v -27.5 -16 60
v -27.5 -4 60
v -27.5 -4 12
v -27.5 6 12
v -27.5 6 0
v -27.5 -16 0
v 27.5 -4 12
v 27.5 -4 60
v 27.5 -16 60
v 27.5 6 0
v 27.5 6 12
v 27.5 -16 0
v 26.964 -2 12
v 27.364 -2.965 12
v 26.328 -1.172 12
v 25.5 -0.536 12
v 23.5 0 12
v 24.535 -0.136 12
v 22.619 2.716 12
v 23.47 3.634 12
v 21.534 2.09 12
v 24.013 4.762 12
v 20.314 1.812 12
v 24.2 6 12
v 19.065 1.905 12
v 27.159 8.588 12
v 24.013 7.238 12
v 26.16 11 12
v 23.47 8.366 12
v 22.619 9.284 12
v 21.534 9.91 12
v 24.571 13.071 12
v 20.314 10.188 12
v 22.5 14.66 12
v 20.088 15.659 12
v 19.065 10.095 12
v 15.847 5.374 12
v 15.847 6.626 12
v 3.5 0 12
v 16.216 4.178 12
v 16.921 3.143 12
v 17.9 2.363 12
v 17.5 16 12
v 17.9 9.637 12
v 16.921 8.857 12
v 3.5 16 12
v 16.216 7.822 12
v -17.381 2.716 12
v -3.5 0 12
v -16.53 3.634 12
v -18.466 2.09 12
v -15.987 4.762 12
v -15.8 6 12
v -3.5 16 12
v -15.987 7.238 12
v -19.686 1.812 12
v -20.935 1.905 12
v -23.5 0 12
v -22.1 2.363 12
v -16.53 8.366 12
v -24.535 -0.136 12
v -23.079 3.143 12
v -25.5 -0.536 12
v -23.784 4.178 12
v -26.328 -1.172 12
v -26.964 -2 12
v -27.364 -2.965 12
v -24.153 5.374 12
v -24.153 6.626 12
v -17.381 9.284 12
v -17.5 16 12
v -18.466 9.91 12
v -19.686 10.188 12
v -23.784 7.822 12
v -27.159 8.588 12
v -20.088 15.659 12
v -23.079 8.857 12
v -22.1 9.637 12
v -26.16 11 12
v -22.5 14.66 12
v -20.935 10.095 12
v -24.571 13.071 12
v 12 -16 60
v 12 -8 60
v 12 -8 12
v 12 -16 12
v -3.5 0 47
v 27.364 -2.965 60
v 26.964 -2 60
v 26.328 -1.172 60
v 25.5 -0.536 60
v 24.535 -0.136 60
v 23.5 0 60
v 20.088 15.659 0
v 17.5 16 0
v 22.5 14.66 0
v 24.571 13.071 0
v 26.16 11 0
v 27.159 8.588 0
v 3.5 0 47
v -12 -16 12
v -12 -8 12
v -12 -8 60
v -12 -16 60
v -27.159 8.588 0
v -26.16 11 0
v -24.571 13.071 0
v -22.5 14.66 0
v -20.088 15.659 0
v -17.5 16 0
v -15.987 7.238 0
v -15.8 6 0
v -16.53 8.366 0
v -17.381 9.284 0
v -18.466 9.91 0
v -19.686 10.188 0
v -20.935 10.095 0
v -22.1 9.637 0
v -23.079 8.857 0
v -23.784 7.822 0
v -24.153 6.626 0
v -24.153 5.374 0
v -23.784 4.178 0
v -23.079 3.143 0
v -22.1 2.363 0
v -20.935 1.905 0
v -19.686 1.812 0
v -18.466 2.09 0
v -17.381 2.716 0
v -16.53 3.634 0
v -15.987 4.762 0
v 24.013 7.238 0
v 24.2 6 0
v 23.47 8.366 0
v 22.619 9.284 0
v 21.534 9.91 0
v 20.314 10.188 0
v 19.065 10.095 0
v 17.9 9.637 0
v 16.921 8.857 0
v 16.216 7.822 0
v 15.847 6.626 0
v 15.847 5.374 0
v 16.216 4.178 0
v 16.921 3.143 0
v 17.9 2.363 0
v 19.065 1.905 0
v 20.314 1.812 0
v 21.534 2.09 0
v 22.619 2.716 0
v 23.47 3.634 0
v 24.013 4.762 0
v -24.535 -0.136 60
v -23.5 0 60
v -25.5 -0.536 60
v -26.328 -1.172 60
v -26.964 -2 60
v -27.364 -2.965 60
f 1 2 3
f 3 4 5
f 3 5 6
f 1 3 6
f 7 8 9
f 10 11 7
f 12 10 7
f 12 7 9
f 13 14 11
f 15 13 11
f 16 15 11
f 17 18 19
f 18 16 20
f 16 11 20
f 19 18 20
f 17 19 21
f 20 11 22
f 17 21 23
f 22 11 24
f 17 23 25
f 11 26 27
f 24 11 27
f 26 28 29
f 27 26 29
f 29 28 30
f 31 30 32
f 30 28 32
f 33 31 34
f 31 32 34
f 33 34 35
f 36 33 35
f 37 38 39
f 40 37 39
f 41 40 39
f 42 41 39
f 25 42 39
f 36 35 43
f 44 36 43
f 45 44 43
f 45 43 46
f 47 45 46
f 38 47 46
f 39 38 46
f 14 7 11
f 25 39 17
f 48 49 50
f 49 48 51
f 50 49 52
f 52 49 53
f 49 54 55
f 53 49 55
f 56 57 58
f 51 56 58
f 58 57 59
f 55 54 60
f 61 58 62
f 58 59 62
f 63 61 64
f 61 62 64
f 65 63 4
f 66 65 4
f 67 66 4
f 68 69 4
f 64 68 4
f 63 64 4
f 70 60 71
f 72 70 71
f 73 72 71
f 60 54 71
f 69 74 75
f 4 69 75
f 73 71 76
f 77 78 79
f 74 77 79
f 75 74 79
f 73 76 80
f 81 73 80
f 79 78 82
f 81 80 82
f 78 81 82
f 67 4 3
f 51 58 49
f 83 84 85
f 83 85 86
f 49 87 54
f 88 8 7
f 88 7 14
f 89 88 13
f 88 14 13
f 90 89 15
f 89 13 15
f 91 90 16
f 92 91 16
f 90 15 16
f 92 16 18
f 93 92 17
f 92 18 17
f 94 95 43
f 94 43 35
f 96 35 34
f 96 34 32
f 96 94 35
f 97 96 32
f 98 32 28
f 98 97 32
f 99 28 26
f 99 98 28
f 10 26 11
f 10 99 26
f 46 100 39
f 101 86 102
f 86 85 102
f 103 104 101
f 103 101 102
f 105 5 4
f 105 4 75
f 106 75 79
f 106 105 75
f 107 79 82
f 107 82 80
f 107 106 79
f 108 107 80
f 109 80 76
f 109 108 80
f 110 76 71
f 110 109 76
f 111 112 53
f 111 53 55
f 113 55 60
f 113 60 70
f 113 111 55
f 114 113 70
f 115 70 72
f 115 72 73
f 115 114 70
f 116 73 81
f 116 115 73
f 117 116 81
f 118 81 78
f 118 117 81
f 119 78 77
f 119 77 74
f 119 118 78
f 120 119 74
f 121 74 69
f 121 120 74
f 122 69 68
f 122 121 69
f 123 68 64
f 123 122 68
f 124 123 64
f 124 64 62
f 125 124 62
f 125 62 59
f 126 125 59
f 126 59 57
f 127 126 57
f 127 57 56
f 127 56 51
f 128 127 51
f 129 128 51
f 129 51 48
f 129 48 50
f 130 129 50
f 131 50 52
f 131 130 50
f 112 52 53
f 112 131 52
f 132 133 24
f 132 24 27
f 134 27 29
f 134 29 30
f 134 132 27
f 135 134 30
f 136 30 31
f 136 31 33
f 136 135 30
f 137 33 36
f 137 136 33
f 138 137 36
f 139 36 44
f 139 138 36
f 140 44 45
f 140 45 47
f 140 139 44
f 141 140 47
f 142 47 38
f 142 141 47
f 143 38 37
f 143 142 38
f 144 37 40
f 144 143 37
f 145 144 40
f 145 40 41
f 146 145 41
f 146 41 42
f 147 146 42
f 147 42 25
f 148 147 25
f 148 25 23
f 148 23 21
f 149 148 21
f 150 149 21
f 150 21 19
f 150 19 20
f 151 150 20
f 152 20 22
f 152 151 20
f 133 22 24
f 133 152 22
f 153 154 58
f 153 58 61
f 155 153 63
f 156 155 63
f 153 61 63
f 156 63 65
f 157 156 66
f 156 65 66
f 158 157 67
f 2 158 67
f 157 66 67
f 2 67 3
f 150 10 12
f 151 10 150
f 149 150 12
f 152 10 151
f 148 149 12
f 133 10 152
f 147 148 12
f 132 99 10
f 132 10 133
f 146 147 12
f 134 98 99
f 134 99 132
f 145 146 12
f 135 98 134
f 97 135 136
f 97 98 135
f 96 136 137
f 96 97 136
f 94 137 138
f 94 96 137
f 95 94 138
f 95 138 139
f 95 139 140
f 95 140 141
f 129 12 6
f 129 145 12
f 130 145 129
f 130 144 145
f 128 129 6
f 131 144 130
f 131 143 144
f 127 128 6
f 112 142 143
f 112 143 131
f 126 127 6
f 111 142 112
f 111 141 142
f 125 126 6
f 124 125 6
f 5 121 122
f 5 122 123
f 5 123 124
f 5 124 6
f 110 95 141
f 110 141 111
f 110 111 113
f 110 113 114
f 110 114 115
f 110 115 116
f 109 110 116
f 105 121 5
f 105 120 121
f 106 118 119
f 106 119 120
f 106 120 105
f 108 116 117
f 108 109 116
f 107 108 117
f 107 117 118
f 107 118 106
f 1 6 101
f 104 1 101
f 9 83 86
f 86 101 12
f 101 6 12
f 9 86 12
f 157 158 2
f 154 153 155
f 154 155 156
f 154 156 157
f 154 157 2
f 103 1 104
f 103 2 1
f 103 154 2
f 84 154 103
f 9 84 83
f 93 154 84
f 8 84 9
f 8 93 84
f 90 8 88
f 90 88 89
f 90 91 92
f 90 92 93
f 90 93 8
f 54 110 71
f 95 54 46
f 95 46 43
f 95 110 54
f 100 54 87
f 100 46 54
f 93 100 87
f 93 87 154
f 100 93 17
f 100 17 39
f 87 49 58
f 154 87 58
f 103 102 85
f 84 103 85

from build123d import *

# Parameters (mm, degrees)
IZIM1_R                     = 4.2
Y_KSEKLIK_EKSTR_ZYON1_DEPTH = 12
Y_KSEKLIK_EKSTR_ZYON2_DEPTH = 48
Y_KSEKLIK_EKSTR_ZYON3_DEPTH = 3.5


with BuildPart() as part:
    # Çizim1 → Yükseklik-Ekstrüzyon1 (new body)
    with BuildSketch(Plane.XY):
        with BuildLine():
            Line((-17.5, 16), (17.5, 16))
            ThreePointArc((17.5, 16), (24.571067812, 13.071067812), (27.5, 6))
            Line((27.5, 6), (27.5, -16))
            Line((27.5, -16), (-27.5, -16))
            Line((-27.5, -16), (-27.5, 6))
            ThreePointArc((-27.5, 6), (-24.571067812, 13.071067812), (-17.5, 16))
        make_face()
        with Locations((-20, 6)):
            Circle(IZIM1_R, mode=Mode.SUBTRACT)
        with Locations((20, 6)):
            Circle(IZIM1_R, mode=Mode.SUBTRACT)
    extrude(amount=Y_KSEKLIK_EKSTR_ZYON1_DEPTH)

    # Çizim2 → Yükseklik-Ekstrüzyon2 (add)
    with BuildSketch(Plane.XY.offset(12)):
        with BuildLine():
            Line((-27.5, -16), (-12, -16))
            Line((-12, -16), (-12, -8))
            Line((-12, -8), (12, -8))
            Line((12, -8), (12, -16))
            Line((12, -16), (27.5, -16))
            Line((27.5, -16), (27.5, -4))
            ThreePointArc((27.5, -4), (26.328427125, -1.171572875), (23.5, 0))
            Line((23.5, 0), (-23.5, 0))
            ThreePointArc((-23.5, 0), (-26.328427125, -1.171572875), (-27.5, -4))
            Line((-27.5, -4), (-27.5, -16))
        make_face()
    extrude(amount=Y_KSEKLIK_EKSTR_ZYON2_DEPTH)

    # Çizim3 → Yükseklik-Ekstrüzyon3 (add, symmetric)
    with BuildSketch(Plane(origin=(0, 0, 0), x_dir=(0, 0, -1), z_dir=(1, 0, 0))):
        Polygon((-12, 16), (-47, 0), (-12, 0), align=None)
    extrude(amount=Y_KSEKLIK_EKSTR_ZYON3_DEPTH, both=True)


solid = part.part
